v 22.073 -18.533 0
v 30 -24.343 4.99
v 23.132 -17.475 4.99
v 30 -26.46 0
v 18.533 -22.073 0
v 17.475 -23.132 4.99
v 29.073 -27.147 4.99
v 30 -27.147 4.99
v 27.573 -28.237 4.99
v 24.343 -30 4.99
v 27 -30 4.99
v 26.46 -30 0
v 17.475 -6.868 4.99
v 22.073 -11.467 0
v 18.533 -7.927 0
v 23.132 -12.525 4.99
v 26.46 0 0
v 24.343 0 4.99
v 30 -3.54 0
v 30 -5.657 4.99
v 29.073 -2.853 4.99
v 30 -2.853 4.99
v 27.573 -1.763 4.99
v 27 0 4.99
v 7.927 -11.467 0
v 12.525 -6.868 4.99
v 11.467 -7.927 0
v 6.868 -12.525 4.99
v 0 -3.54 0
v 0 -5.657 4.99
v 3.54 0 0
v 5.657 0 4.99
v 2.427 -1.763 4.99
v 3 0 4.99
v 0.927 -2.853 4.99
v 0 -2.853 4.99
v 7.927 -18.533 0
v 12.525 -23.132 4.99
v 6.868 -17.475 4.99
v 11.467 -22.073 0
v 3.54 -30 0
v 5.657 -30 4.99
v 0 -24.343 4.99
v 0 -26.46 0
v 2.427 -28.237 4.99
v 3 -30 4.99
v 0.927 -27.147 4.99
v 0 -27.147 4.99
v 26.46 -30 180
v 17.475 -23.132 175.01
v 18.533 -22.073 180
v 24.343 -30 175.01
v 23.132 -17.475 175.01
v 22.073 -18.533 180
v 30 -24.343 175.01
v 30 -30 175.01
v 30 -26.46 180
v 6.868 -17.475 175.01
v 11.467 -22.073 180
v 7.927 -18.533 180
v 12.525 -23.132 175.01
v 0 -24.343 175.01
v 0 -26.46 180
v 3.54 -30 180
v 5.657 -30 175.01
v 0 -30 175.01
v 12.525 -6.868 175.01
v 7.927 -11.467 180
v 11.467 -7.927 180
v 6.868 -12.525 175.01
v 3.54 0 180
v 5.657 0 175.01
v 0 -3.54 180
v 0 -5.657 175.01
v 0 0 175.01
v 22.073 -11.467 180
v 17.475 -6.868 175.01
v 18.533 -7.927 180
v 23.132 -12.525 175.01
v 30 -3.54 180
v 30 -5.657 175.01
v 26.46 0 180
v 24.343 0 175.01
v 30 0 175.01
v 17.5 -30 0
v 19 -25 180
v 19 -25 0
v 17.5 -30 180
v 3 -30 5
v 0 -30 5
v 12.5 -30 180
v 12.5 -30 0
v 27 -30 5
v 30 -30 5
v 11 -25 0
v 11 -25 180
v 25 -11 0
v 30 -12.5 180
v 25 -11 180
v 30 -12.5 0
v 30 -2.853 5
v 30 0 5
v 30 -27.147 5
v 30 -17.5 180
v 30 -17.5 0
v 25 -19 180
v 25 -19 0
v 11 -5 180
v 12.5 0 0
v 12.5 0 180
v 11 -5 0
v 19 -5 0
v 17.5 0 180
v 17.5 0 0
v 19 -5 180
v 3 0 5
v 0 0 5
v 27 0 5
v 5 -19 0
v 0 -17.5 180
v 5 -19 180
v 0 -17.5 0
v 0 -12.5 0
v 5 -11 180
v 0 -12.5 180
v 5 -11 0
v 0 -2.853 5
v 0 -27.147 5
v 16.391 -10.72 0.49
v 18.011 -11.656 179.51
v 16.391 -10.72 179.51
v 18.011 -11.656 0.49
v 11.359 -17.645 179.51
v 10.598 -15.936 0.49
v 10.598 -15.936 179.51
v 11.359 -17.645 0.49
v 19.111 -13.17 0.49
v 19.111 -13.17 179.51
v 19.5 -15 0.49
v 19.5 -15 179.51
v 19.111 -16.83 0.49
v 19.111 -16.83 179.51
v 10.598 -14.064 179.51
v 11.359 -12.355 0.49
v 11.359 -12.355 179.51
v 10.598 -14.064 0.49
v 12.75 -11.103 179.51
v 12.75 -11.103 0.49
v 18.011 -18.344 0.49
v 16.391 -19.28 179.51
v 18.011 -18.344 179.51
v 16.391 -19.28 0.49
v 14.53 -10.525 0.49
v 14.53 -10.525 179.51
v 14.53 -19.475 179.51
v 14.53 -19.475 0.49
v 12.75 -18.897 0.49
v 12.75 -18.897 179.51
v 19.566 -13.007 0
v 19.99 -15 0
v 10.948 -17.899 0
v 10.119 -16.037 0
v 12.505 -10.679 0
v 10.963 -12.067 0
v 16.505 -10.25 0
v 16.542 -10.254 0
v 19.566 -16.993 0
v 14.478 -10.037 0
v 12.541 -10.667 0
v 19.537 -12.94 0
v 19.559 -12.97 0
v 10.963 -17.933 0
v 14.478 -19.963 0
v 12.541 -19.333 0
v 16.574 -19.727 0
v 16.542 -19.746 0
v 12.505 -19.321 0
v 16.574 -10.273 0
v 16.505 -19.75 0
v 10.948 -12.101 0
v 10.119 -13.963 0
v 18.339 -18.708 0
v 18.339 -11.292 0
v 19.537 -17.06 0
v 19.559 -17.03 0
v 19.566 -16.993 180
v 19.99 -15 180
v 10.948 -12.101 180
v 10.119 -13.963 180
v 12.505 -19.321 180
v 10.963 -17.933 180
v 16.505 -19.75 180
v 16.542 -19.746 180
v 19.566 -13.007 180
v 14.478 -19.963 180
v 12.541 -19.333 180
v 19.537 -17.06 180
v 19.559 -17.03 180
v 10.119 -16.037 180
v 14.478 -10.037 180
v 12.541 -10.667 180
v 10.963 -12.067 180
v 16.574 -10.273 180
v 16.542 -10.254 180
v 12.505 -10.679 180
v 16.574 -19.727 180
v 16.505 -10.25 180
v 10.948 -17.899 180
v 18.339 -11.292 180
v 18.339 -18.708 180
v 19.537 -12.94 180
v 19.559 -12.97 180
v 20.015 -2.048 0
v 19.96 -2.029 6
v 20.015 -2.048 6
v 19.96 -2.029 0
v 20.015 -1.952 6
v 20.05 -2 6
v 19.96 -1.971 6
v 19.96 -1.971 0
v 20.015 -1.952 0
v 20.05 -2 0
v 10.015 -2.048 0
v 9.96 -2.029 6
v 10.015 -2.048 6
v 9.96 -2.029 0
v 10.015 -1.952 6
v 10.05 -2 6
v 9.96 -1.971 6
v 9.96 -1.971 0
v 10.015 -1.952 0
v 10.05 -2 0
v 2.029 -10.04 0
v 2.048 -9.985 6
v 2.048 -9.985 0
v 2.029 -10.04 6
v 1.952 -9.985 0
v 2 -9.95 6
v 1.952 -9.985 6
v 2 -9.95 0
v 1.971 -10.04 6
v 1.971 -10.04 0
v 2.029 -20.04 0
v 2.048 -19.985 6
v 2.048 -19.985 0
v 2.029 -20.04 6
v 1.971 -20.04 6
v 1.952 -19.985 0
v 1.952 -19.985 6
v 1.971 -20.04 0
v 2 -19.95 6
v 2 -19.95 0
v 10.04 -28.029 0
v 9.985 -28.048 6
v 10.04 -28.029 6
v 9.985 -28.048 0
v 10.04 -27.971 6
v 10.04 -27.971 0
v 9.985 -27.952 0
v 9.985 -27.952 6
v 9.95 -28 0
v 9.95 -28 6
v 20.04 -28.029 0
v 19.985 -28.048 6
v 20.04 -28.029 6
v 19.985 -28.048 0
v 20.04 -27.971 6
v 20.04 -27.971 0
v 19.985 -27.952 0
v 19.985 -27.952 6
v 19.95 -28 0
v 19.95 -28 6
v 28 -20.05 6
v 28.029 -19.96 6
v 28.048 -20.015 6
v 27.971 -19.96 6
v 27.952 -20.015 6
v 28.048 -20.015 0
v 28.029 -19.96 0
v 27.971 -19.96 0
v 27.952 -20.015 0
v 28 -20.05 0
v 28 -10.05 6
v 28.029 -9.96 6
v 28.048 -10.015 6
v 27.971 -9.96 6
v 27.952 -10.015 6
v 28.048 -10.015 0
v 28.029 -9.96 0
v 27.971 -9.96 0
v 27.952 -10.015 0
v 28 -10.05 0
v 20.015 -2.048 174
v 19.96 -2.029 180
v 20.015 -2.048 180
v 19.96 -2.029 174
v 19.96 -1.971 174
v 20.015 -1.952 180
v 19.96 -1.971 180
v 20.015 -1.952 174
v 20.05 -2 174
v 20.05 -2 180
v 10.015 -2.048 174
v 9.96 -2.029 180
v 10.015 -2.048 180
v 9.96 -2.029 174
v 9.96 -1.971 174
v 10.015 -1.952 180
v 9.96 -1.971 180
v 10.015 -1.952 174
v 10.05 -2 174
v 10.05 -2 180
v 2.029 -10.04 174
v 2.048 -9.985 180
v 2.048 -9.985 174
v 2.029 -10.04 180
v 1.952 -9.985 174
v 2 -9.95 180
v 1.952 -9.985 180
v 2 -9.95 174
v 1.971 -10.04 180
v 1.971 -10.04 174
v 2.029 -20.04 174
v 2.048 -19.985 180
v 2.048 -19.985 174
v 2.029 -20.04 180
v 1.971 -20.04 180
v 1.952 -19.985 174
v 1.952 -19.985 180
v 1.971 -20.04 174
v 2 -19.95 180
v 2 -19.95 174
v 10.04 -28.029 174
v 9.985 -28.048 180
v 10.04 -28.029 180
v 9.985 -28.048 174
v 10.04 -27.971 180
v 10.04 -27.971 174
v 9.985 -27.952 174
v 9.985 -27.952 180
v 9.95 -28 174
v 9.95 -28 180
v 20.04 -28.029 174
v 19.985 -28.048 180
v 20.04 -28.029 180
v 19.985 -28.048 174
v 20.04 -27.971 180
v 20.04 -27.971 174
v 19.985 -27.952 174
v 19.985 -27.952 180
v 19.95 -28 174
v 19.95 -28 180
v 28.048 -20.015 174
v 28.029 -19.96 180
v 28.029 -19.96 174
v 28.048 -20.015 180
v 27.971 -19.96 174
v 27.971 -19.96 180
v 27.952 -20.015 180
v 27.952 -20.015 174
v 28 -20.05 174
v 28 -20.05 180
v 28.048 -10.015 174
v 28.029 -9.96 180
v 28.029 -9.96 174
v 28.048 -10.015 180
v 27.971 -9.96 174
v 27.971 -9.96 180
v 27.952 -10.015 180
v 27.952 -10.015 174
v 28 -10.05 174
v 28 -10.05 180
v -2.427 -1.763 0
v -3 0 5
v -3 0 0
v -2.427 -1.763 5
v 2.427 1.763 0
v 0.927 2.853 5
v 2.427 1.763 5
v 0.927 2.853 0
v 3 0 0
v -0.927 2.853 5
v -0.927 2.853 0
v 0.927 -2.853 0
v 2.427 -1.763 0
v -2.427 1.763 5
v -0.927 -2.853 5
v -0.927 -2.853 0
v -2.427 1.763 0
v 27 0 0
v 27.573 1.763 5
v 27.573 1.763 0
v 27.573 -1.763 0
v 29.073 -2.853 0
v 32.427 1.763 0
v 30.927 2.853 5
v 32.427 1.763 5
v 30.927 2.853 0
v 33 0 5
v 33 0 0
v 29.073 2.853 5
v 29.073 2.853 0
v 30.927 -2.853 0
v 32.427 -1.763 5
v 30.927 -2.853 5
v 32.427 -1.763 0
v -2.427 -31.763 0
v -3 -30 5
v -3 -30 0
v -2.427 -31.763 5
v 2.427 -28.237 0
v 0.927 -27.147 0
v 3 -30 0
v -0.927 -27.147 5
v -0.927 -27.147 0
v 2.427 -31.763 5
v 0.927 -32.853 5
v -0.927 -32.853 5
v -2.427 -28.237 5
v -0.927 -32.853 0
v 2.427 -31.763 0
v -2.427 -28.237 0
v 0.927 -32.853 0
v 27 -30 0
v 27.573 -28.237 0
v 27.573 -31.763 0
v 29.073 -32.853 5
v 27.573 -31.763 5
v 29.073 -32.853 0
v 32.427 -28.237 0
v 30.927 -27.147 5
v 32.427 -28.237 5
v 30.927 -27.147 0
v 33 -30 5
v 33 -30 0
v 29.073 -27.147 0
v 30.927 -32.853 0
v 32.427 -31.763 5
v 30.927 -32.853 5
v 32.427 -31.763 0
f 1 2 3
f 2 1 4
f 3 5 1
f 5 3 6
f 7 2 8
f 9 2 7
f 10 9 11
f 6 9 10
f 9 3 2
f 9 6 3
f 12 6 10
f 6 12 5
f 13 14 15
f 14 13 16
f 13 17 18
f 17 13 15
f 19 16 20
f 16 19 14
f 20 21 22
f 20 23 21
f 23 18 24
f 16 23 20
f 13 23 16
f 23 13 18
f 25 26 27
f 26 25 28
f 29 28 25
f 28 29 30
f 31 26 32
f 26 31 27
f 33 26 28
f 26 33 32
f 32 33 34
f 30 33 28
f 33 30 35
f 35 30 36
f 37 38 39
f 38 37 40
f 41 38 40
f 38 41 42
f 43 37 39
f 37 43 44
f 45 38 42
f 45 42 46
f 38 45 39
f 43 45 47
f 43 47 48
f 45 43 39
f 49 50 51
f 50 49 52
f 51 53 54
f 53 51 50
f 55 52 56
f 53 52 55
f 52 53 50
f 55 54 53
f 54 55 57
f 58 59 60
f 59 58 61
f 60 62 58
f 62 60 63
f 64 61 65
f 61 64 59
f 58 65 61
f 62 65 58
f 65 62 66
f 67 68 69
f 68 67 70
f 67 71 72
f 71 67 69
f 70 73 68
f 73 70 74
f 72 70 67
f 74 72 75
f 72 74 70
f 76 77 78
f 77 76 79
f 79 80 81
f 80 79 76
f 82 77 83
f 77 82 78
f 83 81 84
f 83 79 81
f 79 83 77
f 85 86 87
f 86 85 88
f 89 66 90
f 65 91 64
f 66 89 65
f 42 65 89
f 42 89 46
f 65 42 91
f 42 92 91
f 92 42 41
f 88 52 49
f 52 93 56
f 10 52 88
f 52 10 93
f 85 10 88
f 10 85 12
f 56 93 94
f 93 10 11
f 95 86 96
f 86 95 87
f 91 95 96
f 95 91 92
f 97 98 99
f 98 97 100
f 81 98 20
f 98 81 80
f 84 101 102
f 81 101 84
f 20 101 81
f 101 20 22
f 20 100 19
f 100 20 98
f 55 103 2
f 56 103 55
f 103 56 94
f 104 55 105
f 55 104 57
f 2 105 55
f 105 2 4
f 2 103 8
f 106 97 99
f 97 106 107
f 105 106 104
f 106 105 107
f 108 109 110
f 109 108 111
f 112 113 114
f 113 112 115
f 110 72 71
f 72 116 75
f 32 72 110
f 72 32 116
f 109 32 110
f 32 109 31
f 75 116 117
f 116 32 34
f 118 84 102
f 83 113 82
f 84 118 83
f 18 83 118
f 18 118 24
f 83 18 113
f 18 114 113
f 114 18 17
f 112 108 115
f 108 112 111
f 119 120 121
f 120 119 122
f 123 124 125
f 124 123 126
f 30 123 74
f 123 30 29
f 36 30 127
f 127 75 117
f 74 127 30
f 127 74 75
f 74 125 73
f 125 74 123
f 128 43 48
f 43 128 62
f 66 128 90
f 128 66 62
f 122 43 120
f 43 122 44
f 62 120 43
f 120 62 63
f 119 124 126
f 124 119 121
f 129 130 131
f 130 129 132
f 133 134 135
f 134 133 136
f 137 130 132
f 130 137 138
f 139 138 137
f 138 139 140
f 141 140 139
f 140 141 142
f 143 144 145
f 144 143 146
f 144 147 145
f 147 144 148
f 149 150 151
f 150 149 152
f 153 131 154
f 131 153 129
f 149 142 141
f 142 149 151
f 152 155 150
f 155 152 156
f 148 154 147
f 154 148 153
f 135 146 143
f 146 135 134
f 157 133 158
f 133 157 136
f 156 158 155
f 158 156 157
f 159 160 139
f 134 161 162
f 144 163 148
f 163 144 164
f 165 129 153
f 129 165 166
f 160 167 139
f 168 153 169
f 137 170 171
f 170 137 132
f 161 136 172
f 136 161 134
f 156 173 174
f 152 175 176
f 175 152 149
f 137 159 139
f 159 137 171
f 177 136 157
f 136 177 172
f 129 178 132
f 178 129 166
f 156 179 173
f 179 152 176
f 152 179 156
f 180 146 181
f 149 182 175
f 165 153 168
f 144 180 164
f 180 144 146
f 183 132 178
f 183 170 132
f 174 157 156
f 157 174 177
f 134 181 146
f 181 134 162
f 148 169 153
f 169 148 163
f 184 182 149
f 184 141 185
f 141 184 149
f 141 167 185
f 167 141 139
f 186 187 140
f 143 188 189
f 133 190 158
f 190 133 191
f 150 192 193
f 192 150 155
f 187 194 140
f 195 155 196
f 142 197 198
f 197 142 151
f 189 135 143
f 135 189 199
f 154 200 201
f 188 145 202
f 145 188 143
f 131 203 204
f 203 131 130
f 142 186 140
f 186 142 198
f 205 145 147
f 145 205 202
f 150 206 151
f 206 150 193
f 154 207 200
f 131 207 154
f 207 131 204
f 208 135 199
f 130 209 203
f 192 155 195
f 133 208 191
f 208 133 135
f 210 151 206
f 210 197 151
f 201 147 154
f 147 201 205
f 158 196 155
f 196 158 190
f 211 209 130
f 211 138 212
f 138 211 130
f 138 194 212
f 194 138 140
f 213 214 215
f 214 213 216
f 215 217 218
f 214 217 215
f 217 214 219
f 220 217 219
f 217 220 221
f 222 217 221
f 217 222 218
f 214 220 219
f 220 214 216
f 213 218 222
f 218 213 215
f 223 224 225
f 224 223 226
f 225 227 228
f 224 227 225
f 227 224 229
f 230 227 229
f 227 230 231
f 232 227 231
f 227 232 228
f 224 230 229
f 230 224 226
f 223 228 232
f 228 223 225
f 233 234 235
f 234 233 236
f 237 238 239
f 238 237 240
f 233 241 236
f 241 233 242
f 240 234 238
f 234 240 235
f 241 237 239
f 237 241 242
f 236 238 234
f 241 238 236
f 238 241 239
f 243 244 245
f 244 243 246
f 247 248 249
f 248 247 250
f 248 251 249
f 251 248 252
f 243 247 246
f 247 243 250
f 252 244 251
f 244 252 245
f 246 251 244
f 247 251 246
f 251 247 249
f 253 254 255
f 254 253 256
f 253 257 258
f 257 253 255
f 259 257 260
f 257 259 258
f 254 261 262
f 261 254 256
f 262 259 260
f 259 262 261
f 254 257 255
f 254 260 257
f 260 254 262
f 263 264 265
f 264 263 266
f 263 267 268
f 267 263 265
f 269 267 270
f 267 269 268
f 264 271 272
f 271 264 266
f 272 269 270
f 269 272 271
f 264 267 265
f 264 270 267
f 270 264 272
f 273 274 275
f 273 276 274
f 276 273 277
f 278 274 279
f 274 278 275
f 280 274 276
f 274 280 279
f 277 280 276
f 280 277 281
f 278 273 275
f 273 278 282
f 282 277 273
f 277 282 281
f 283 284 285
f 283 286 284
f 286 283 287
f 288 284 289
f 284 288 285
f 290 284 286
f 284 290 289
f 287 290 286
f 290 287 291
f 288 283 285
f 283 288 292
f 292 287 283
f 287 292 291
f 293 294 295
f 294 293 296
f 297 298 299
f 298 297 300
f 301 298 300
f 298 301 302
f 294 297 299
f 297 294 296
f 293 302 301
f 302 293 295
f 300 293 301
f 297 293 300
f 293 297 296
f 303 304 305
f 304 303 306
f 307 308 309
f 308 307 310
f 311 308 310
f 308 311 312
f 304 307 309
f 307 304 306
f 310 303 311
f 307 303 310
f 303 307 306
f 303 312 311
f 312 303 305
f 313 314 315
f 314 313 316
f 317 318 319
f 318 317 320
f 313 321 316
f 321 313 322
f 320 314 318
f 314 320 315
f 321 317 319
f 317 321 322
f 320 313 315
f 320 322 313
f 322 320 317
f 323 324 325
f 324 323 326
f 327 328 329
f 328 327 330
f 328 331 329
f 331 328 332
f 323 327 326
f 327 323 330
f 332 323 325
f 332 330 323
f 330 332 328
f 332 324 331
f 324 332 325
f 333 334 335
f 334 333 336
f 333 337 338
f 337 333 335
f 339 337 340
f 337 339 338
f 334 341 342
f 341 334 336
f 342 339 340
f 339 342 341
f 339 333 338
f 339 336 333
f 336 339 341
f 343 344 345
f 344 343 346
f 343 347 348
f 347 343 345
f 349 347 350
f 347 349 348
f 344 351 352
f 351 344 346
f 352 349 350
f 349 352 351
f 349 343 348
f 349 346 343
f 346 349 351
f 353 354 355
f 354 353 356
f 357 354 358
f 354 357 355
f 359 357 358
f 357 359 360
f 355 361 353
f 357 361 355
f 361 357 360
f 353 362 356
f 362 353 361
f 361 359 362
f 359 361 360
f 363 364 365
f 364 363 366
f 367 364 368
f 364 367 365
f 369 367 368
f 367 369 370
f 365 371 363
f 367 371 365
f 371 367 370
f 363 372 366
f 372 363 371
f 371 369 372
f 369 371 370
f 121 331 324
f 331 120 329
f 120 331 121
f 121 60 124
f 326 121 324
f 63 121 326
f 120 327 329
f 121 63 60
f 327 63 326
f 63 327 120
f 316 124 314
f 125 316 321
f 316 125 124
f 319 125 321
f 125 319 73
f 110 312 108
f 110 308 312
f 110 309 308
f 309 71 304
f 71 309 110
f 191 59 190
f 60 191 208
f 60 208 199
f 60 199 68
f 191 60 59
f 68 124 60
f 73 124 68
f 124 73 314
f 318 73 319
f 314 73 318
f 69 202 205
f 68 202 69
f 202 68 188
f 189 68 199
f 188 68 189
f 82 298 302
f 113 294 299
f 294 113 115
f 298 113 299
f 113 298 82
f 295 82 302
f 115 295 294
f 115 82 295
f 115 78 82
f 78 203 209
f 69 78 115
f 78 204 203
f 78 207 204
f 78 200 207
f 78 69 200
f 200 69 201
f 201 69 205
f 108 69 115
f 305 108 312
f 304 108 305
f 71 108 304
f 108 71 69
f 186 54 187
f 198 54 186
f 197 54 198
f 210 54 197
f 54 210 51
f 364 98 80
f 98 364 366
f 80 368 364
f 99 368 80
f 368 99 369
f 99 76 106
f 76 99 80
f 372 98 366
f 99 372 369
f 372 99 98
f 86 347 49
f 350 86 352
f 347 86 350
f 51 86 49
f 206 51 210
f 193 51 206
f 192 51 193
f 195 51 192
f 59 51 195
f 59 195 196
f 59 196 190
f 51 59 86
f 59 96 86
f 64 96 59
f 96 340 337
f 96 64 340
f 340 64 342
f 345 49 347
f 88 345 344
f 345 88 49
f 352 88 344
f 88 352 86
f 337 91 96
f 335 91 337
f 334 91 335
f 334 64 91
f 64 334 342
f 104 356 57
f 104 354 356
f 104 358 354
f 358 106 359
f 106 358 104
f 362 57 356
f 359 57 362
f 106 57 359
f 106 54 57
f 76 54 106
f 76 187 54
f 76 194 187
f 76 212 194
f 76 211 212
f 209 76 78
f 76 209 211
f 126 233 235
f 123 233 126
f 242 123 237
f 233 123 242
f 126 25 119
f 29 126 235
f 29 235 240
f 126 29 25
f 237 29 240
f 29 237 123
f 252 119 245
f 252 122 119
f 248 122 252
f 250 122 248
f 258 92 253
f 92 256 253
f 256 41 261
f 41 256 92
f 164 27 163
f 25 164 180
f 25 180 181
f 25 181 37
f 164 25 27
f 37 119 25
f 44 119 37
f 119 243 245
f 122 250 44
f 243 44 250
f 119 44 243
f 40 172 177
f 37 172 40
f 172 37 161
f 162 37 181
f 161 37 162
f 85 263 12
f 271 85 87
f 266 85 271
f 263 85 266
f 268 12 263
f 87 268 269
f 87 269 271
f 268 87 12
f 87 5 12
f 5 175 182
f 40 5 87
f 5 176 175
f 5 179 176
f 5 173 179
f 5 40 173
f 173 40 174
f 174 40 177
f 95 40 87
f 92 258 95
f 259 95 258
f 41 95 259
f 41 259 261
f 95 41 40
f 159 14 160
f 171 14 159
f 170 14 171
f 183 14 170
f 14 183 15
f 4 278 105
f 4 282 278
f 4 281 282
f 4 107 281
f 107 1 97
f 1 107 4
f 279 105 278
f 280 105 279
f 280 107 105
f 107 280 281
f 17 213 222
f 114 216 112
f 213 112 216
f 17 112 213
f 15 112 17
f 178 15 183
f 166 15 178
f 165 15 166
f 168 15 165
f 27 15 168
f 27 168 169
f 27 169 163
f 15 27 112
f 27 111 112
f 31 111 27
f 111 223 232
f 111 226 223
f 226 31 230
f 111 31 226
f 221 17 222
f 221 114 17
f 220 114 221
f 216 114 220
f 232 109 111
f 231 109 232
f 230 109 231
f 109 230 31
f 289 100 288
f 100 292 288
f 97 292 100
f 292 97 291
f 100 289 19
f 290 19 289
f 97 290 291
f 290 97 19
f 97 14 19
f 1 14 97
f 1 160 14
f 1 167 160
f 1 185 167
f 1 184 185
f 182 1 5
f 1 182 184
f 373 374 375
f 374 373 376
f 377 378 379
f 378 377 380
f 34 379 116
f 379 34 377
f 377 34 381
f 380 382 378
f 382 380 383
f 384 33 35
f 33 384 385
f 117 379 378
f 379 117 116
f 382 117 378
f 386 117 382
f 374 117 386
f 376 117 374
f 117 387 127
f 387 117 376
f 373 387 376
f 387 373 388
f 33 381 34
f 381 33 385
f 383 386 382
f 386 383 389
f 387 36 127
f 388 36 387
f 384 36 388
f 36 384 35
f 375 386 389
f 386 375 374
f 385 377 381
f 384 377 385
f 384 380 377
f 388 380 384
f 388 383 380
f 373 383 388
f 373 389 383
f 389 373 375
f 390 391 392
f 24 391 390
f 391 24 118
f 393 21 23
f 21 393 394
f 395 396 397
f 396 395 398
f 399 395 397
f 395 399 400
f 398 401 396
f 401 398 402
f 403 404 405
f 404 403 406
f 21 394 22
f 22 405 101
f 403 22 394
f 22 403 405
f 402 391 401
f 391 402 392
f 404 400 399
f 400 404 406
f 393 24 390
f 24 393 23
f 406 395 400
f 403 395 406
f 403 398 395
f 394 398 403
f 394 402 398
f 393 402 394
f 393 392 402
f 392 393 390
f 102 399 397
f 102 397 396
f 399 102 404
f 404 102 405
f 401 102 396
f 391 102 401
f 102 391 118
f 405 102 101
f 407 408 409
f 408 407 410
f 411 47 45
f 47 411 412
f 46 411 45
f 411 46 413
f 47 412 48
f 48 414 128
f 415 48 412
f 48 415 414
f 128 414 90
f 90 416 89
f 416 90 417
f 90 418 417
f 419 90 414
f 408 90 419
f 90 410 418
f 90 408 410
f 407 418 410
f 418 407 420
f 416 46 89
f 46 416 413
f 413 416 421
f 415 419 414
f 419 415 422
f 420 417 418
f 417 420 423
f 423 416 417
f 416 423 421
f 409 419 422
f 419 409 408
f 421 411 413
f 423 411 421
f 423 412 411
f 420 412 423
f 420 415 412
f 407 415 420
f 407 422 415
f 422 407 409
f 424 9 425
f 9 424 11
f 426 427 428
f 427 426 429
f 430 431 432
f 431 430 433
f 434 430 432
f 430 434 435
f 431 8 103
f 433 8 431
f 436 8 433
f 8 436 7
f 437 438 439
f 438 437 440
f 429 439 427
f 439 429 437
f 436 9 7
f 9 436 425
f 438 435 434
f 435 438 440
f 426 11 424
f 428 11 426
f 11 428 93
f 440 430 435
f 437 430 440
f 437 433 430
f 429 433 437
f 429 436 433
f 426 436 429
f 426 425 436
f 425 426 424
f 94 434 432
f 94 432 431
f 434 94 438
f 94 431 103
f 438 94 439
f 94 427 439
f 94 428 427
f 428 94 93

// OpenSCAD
// file: globals.scad
/*
Most things in this file is represented as one millimeter, so keep that in mind while changing things.
Some of the setting are not mm but at variables that you can set, such as 2*x=2x and you are setting what x is.
I will try to specify when things are variables and not exact measurements.
*/

// printer slop
slop = 0.15;

obj_leg = 30;
leg_length = 5.5;
small_number = 0.001;
metal_core_rode_global = 5;


///////////////// number of holes /////////////////////
z_hole_number = 8;
other_holes = 8;

///////////////// Pins /////////////////////

//pins that poke out
ball_size = 10;
pin_height = 20;
pin_diameter = 6;


//holes
hole_ball_size = ball_size;
hole_pin_height = pin_height;
hole_pin_diameter = pin_diameter;

///////////////// Z THINGS /////////////////////

berring_slot_width = 7.5;
berring_slot_depth = 6.5;
metal_core_rode = 5;

///////////////// X THINGS /////////////////////

//male dove tails
male_dove_max_width=8;
male_dove_min_width=5;
male_dove_depth=5;
male_dove_height=obj_leg/2;

function scaled_male_dove_max_width() = male_dove_max_width;
function scaled_male_dove_min_width() = male_dove_min_width - 0.5*slop;
function scaled_male_dove_depth() = male_dove_depth - .2;

//female dove tails, this is found on the y mounts
girl_max_width=11;
girl_min_width=5;
girl_depth=5;
girl_height=obj_leg;


///////////////// Y THINGS /////////////////////
/*
The Y is so normal that all of those global variables at the top should change all of the setting in it, this section is set her incase there are variables set in the future development of this project.
*/

// stepper
motor_side_length = 43.2;
motor_bolt_hole_distance = 31;
motor_center_hole = 23;
motor_shaft_dia = 5;
motor_shaft_hole_dia = 5;

// bolts etc.
bolt_hole_dia = 3+2*slop;
bolt_head_hole_dia = 6.2;

m4_bolt_hole_dia = 4+2*slop;
m4_bolt_head_hole_dia = 6.8+2*slop;

m3_nut_side = 5.65;
m3_nut_height = 2.3;
m4_nut_side = 6.85;
m4_nut_height = 3.1;

// threaded rod
lifter_rod_diam = 9.86;
hole_threaded_rod = lifter_rod_diam+2*slop;

// for the extensions
metal_rod_size = 9;

// z screw
z_screw_d = 25;

// stabilizer
pin_bolt_dia = 12-2*slop;
pin_bolt_dia_minus = 12+2*slop;

clip_bolt_dia = 10-2*slop;
clip_bolt_dia_minus = 10+2*slop;
// main file
include <include.scad>;
include <globals.scad>;

support = true;
//min number of units is 2
//unit size is 30mm
//max is however large your printer can print
units = 4;

module extention_base(length, support=true){
	
	module added(){
			translate([0,0,0]) cube([30,length,30]);
	}

	module subtracted(){
        translate([15,0,15]) rotate([0,45,0]) tie_end();
        translate([15,length,15]) rotate([0,45,0]) rotate([0,0,180]) tie_end();
        translate([15,-1,15]) rotate([-90,0,0]) cylinder(h=length+2, d=metal_rod_size,$fn=15);
        translate([15,-0.01,15]) rotate([-90,0,0]) cylinder(d1=metal_rod_size+1,d2=metal_rod_size,h=0.5,$fn=15);
        translate([15,length+0.01,15]) rotate([90,0,0]) cylinder(d1=metal_rod_size+1,d2=metal_rod_size,h=0.5,$fn=15);

        translate([15, -1, 15]){
            for (r = [0:4]) // two iterations, z = -1, z = 1
            {
                rotate([0,r*90,0]) translate([0,0,15]) rotate([-90,0,0])male_dovetail(height=length+2);
            }
        }
    } //subtracted

    module infill() {
        rotate([-90,0,0]) translate([30/2,-30/2,0]) {
            for(i = [0:3]) {
                rotate([0,0,360/4*i]) translate([5,30/2-2,0]) cylinder(d=0.1,h=7);
                rotate([0,0,360/4*i]) translate([-5,30/2-2,0]) cylinder(d=0.1,h=7);
            }
        }
    }

	difference(){
		added();
		subtracted();
        translate([0,-1,0])infill();
        translate([0,length-6,0]) infill();
	}
    //support
    if (support==true)
    {
        rotate([-90,0,0]) {
            translate([0,0,5/2]) cylinder(h=5, d=6, center=true);
            translate([30,0,5/2]) cylinder(h=5, d=6, center=true);
            translate([0,-30,5/2]) cylinder(h=5, d=6, center=true);
            translate([30,-30,5/2]) cylinder(h=5, d=6, center=true);
        }
    }
} //module extention



module extention(units=units, support=support){
    rotate([90,0,0]) extention_base(units*30, support=support);
}

module extention_center(length=120, stopper_position=60) {
    // leave a bit of gap
    l = length - 1;
    sp = stopper_position - 0.5;
    difference() {
        union() {
            intersection() {
                ridged_cylinder(d=metal_rod_size-0.1, h=l, r=2, $fn=15);
                chamfered_cylinder(metal_rod_size,l,1,$fn=15);
            }
            hull() {
                translate([0,0,sp]) cube_donut(metal_rod_size,0.5,rotation=45,$fn=15);
            }
        }
        cylinder(d=1,h=l,$fn=10);
    }
}

// 60cm extention
//extention(2);
//extention_center(length=60,stopper_position=60/2);

// 90cm extention
//extention(3);
//extention_center(length=90,stopper_position=90/2);

// 120cm extention
//extention();
//extention_center();

// 150cm extention
//extention(5);
//extention_center(length=150,stopper_position=150/2);

// 180cm extention
extention(6);
//extention_center(length=180,stopper_position=180/2);

// centers for corner
//extention_center(length=90/2+30,stopper_position=30);
//extention_center(length=120/2+30,stopper_position=30);
//extention_center(length=150/2+30,stopper_position=30);
//extention_center(length=180/2+30,stopper_position=30);
